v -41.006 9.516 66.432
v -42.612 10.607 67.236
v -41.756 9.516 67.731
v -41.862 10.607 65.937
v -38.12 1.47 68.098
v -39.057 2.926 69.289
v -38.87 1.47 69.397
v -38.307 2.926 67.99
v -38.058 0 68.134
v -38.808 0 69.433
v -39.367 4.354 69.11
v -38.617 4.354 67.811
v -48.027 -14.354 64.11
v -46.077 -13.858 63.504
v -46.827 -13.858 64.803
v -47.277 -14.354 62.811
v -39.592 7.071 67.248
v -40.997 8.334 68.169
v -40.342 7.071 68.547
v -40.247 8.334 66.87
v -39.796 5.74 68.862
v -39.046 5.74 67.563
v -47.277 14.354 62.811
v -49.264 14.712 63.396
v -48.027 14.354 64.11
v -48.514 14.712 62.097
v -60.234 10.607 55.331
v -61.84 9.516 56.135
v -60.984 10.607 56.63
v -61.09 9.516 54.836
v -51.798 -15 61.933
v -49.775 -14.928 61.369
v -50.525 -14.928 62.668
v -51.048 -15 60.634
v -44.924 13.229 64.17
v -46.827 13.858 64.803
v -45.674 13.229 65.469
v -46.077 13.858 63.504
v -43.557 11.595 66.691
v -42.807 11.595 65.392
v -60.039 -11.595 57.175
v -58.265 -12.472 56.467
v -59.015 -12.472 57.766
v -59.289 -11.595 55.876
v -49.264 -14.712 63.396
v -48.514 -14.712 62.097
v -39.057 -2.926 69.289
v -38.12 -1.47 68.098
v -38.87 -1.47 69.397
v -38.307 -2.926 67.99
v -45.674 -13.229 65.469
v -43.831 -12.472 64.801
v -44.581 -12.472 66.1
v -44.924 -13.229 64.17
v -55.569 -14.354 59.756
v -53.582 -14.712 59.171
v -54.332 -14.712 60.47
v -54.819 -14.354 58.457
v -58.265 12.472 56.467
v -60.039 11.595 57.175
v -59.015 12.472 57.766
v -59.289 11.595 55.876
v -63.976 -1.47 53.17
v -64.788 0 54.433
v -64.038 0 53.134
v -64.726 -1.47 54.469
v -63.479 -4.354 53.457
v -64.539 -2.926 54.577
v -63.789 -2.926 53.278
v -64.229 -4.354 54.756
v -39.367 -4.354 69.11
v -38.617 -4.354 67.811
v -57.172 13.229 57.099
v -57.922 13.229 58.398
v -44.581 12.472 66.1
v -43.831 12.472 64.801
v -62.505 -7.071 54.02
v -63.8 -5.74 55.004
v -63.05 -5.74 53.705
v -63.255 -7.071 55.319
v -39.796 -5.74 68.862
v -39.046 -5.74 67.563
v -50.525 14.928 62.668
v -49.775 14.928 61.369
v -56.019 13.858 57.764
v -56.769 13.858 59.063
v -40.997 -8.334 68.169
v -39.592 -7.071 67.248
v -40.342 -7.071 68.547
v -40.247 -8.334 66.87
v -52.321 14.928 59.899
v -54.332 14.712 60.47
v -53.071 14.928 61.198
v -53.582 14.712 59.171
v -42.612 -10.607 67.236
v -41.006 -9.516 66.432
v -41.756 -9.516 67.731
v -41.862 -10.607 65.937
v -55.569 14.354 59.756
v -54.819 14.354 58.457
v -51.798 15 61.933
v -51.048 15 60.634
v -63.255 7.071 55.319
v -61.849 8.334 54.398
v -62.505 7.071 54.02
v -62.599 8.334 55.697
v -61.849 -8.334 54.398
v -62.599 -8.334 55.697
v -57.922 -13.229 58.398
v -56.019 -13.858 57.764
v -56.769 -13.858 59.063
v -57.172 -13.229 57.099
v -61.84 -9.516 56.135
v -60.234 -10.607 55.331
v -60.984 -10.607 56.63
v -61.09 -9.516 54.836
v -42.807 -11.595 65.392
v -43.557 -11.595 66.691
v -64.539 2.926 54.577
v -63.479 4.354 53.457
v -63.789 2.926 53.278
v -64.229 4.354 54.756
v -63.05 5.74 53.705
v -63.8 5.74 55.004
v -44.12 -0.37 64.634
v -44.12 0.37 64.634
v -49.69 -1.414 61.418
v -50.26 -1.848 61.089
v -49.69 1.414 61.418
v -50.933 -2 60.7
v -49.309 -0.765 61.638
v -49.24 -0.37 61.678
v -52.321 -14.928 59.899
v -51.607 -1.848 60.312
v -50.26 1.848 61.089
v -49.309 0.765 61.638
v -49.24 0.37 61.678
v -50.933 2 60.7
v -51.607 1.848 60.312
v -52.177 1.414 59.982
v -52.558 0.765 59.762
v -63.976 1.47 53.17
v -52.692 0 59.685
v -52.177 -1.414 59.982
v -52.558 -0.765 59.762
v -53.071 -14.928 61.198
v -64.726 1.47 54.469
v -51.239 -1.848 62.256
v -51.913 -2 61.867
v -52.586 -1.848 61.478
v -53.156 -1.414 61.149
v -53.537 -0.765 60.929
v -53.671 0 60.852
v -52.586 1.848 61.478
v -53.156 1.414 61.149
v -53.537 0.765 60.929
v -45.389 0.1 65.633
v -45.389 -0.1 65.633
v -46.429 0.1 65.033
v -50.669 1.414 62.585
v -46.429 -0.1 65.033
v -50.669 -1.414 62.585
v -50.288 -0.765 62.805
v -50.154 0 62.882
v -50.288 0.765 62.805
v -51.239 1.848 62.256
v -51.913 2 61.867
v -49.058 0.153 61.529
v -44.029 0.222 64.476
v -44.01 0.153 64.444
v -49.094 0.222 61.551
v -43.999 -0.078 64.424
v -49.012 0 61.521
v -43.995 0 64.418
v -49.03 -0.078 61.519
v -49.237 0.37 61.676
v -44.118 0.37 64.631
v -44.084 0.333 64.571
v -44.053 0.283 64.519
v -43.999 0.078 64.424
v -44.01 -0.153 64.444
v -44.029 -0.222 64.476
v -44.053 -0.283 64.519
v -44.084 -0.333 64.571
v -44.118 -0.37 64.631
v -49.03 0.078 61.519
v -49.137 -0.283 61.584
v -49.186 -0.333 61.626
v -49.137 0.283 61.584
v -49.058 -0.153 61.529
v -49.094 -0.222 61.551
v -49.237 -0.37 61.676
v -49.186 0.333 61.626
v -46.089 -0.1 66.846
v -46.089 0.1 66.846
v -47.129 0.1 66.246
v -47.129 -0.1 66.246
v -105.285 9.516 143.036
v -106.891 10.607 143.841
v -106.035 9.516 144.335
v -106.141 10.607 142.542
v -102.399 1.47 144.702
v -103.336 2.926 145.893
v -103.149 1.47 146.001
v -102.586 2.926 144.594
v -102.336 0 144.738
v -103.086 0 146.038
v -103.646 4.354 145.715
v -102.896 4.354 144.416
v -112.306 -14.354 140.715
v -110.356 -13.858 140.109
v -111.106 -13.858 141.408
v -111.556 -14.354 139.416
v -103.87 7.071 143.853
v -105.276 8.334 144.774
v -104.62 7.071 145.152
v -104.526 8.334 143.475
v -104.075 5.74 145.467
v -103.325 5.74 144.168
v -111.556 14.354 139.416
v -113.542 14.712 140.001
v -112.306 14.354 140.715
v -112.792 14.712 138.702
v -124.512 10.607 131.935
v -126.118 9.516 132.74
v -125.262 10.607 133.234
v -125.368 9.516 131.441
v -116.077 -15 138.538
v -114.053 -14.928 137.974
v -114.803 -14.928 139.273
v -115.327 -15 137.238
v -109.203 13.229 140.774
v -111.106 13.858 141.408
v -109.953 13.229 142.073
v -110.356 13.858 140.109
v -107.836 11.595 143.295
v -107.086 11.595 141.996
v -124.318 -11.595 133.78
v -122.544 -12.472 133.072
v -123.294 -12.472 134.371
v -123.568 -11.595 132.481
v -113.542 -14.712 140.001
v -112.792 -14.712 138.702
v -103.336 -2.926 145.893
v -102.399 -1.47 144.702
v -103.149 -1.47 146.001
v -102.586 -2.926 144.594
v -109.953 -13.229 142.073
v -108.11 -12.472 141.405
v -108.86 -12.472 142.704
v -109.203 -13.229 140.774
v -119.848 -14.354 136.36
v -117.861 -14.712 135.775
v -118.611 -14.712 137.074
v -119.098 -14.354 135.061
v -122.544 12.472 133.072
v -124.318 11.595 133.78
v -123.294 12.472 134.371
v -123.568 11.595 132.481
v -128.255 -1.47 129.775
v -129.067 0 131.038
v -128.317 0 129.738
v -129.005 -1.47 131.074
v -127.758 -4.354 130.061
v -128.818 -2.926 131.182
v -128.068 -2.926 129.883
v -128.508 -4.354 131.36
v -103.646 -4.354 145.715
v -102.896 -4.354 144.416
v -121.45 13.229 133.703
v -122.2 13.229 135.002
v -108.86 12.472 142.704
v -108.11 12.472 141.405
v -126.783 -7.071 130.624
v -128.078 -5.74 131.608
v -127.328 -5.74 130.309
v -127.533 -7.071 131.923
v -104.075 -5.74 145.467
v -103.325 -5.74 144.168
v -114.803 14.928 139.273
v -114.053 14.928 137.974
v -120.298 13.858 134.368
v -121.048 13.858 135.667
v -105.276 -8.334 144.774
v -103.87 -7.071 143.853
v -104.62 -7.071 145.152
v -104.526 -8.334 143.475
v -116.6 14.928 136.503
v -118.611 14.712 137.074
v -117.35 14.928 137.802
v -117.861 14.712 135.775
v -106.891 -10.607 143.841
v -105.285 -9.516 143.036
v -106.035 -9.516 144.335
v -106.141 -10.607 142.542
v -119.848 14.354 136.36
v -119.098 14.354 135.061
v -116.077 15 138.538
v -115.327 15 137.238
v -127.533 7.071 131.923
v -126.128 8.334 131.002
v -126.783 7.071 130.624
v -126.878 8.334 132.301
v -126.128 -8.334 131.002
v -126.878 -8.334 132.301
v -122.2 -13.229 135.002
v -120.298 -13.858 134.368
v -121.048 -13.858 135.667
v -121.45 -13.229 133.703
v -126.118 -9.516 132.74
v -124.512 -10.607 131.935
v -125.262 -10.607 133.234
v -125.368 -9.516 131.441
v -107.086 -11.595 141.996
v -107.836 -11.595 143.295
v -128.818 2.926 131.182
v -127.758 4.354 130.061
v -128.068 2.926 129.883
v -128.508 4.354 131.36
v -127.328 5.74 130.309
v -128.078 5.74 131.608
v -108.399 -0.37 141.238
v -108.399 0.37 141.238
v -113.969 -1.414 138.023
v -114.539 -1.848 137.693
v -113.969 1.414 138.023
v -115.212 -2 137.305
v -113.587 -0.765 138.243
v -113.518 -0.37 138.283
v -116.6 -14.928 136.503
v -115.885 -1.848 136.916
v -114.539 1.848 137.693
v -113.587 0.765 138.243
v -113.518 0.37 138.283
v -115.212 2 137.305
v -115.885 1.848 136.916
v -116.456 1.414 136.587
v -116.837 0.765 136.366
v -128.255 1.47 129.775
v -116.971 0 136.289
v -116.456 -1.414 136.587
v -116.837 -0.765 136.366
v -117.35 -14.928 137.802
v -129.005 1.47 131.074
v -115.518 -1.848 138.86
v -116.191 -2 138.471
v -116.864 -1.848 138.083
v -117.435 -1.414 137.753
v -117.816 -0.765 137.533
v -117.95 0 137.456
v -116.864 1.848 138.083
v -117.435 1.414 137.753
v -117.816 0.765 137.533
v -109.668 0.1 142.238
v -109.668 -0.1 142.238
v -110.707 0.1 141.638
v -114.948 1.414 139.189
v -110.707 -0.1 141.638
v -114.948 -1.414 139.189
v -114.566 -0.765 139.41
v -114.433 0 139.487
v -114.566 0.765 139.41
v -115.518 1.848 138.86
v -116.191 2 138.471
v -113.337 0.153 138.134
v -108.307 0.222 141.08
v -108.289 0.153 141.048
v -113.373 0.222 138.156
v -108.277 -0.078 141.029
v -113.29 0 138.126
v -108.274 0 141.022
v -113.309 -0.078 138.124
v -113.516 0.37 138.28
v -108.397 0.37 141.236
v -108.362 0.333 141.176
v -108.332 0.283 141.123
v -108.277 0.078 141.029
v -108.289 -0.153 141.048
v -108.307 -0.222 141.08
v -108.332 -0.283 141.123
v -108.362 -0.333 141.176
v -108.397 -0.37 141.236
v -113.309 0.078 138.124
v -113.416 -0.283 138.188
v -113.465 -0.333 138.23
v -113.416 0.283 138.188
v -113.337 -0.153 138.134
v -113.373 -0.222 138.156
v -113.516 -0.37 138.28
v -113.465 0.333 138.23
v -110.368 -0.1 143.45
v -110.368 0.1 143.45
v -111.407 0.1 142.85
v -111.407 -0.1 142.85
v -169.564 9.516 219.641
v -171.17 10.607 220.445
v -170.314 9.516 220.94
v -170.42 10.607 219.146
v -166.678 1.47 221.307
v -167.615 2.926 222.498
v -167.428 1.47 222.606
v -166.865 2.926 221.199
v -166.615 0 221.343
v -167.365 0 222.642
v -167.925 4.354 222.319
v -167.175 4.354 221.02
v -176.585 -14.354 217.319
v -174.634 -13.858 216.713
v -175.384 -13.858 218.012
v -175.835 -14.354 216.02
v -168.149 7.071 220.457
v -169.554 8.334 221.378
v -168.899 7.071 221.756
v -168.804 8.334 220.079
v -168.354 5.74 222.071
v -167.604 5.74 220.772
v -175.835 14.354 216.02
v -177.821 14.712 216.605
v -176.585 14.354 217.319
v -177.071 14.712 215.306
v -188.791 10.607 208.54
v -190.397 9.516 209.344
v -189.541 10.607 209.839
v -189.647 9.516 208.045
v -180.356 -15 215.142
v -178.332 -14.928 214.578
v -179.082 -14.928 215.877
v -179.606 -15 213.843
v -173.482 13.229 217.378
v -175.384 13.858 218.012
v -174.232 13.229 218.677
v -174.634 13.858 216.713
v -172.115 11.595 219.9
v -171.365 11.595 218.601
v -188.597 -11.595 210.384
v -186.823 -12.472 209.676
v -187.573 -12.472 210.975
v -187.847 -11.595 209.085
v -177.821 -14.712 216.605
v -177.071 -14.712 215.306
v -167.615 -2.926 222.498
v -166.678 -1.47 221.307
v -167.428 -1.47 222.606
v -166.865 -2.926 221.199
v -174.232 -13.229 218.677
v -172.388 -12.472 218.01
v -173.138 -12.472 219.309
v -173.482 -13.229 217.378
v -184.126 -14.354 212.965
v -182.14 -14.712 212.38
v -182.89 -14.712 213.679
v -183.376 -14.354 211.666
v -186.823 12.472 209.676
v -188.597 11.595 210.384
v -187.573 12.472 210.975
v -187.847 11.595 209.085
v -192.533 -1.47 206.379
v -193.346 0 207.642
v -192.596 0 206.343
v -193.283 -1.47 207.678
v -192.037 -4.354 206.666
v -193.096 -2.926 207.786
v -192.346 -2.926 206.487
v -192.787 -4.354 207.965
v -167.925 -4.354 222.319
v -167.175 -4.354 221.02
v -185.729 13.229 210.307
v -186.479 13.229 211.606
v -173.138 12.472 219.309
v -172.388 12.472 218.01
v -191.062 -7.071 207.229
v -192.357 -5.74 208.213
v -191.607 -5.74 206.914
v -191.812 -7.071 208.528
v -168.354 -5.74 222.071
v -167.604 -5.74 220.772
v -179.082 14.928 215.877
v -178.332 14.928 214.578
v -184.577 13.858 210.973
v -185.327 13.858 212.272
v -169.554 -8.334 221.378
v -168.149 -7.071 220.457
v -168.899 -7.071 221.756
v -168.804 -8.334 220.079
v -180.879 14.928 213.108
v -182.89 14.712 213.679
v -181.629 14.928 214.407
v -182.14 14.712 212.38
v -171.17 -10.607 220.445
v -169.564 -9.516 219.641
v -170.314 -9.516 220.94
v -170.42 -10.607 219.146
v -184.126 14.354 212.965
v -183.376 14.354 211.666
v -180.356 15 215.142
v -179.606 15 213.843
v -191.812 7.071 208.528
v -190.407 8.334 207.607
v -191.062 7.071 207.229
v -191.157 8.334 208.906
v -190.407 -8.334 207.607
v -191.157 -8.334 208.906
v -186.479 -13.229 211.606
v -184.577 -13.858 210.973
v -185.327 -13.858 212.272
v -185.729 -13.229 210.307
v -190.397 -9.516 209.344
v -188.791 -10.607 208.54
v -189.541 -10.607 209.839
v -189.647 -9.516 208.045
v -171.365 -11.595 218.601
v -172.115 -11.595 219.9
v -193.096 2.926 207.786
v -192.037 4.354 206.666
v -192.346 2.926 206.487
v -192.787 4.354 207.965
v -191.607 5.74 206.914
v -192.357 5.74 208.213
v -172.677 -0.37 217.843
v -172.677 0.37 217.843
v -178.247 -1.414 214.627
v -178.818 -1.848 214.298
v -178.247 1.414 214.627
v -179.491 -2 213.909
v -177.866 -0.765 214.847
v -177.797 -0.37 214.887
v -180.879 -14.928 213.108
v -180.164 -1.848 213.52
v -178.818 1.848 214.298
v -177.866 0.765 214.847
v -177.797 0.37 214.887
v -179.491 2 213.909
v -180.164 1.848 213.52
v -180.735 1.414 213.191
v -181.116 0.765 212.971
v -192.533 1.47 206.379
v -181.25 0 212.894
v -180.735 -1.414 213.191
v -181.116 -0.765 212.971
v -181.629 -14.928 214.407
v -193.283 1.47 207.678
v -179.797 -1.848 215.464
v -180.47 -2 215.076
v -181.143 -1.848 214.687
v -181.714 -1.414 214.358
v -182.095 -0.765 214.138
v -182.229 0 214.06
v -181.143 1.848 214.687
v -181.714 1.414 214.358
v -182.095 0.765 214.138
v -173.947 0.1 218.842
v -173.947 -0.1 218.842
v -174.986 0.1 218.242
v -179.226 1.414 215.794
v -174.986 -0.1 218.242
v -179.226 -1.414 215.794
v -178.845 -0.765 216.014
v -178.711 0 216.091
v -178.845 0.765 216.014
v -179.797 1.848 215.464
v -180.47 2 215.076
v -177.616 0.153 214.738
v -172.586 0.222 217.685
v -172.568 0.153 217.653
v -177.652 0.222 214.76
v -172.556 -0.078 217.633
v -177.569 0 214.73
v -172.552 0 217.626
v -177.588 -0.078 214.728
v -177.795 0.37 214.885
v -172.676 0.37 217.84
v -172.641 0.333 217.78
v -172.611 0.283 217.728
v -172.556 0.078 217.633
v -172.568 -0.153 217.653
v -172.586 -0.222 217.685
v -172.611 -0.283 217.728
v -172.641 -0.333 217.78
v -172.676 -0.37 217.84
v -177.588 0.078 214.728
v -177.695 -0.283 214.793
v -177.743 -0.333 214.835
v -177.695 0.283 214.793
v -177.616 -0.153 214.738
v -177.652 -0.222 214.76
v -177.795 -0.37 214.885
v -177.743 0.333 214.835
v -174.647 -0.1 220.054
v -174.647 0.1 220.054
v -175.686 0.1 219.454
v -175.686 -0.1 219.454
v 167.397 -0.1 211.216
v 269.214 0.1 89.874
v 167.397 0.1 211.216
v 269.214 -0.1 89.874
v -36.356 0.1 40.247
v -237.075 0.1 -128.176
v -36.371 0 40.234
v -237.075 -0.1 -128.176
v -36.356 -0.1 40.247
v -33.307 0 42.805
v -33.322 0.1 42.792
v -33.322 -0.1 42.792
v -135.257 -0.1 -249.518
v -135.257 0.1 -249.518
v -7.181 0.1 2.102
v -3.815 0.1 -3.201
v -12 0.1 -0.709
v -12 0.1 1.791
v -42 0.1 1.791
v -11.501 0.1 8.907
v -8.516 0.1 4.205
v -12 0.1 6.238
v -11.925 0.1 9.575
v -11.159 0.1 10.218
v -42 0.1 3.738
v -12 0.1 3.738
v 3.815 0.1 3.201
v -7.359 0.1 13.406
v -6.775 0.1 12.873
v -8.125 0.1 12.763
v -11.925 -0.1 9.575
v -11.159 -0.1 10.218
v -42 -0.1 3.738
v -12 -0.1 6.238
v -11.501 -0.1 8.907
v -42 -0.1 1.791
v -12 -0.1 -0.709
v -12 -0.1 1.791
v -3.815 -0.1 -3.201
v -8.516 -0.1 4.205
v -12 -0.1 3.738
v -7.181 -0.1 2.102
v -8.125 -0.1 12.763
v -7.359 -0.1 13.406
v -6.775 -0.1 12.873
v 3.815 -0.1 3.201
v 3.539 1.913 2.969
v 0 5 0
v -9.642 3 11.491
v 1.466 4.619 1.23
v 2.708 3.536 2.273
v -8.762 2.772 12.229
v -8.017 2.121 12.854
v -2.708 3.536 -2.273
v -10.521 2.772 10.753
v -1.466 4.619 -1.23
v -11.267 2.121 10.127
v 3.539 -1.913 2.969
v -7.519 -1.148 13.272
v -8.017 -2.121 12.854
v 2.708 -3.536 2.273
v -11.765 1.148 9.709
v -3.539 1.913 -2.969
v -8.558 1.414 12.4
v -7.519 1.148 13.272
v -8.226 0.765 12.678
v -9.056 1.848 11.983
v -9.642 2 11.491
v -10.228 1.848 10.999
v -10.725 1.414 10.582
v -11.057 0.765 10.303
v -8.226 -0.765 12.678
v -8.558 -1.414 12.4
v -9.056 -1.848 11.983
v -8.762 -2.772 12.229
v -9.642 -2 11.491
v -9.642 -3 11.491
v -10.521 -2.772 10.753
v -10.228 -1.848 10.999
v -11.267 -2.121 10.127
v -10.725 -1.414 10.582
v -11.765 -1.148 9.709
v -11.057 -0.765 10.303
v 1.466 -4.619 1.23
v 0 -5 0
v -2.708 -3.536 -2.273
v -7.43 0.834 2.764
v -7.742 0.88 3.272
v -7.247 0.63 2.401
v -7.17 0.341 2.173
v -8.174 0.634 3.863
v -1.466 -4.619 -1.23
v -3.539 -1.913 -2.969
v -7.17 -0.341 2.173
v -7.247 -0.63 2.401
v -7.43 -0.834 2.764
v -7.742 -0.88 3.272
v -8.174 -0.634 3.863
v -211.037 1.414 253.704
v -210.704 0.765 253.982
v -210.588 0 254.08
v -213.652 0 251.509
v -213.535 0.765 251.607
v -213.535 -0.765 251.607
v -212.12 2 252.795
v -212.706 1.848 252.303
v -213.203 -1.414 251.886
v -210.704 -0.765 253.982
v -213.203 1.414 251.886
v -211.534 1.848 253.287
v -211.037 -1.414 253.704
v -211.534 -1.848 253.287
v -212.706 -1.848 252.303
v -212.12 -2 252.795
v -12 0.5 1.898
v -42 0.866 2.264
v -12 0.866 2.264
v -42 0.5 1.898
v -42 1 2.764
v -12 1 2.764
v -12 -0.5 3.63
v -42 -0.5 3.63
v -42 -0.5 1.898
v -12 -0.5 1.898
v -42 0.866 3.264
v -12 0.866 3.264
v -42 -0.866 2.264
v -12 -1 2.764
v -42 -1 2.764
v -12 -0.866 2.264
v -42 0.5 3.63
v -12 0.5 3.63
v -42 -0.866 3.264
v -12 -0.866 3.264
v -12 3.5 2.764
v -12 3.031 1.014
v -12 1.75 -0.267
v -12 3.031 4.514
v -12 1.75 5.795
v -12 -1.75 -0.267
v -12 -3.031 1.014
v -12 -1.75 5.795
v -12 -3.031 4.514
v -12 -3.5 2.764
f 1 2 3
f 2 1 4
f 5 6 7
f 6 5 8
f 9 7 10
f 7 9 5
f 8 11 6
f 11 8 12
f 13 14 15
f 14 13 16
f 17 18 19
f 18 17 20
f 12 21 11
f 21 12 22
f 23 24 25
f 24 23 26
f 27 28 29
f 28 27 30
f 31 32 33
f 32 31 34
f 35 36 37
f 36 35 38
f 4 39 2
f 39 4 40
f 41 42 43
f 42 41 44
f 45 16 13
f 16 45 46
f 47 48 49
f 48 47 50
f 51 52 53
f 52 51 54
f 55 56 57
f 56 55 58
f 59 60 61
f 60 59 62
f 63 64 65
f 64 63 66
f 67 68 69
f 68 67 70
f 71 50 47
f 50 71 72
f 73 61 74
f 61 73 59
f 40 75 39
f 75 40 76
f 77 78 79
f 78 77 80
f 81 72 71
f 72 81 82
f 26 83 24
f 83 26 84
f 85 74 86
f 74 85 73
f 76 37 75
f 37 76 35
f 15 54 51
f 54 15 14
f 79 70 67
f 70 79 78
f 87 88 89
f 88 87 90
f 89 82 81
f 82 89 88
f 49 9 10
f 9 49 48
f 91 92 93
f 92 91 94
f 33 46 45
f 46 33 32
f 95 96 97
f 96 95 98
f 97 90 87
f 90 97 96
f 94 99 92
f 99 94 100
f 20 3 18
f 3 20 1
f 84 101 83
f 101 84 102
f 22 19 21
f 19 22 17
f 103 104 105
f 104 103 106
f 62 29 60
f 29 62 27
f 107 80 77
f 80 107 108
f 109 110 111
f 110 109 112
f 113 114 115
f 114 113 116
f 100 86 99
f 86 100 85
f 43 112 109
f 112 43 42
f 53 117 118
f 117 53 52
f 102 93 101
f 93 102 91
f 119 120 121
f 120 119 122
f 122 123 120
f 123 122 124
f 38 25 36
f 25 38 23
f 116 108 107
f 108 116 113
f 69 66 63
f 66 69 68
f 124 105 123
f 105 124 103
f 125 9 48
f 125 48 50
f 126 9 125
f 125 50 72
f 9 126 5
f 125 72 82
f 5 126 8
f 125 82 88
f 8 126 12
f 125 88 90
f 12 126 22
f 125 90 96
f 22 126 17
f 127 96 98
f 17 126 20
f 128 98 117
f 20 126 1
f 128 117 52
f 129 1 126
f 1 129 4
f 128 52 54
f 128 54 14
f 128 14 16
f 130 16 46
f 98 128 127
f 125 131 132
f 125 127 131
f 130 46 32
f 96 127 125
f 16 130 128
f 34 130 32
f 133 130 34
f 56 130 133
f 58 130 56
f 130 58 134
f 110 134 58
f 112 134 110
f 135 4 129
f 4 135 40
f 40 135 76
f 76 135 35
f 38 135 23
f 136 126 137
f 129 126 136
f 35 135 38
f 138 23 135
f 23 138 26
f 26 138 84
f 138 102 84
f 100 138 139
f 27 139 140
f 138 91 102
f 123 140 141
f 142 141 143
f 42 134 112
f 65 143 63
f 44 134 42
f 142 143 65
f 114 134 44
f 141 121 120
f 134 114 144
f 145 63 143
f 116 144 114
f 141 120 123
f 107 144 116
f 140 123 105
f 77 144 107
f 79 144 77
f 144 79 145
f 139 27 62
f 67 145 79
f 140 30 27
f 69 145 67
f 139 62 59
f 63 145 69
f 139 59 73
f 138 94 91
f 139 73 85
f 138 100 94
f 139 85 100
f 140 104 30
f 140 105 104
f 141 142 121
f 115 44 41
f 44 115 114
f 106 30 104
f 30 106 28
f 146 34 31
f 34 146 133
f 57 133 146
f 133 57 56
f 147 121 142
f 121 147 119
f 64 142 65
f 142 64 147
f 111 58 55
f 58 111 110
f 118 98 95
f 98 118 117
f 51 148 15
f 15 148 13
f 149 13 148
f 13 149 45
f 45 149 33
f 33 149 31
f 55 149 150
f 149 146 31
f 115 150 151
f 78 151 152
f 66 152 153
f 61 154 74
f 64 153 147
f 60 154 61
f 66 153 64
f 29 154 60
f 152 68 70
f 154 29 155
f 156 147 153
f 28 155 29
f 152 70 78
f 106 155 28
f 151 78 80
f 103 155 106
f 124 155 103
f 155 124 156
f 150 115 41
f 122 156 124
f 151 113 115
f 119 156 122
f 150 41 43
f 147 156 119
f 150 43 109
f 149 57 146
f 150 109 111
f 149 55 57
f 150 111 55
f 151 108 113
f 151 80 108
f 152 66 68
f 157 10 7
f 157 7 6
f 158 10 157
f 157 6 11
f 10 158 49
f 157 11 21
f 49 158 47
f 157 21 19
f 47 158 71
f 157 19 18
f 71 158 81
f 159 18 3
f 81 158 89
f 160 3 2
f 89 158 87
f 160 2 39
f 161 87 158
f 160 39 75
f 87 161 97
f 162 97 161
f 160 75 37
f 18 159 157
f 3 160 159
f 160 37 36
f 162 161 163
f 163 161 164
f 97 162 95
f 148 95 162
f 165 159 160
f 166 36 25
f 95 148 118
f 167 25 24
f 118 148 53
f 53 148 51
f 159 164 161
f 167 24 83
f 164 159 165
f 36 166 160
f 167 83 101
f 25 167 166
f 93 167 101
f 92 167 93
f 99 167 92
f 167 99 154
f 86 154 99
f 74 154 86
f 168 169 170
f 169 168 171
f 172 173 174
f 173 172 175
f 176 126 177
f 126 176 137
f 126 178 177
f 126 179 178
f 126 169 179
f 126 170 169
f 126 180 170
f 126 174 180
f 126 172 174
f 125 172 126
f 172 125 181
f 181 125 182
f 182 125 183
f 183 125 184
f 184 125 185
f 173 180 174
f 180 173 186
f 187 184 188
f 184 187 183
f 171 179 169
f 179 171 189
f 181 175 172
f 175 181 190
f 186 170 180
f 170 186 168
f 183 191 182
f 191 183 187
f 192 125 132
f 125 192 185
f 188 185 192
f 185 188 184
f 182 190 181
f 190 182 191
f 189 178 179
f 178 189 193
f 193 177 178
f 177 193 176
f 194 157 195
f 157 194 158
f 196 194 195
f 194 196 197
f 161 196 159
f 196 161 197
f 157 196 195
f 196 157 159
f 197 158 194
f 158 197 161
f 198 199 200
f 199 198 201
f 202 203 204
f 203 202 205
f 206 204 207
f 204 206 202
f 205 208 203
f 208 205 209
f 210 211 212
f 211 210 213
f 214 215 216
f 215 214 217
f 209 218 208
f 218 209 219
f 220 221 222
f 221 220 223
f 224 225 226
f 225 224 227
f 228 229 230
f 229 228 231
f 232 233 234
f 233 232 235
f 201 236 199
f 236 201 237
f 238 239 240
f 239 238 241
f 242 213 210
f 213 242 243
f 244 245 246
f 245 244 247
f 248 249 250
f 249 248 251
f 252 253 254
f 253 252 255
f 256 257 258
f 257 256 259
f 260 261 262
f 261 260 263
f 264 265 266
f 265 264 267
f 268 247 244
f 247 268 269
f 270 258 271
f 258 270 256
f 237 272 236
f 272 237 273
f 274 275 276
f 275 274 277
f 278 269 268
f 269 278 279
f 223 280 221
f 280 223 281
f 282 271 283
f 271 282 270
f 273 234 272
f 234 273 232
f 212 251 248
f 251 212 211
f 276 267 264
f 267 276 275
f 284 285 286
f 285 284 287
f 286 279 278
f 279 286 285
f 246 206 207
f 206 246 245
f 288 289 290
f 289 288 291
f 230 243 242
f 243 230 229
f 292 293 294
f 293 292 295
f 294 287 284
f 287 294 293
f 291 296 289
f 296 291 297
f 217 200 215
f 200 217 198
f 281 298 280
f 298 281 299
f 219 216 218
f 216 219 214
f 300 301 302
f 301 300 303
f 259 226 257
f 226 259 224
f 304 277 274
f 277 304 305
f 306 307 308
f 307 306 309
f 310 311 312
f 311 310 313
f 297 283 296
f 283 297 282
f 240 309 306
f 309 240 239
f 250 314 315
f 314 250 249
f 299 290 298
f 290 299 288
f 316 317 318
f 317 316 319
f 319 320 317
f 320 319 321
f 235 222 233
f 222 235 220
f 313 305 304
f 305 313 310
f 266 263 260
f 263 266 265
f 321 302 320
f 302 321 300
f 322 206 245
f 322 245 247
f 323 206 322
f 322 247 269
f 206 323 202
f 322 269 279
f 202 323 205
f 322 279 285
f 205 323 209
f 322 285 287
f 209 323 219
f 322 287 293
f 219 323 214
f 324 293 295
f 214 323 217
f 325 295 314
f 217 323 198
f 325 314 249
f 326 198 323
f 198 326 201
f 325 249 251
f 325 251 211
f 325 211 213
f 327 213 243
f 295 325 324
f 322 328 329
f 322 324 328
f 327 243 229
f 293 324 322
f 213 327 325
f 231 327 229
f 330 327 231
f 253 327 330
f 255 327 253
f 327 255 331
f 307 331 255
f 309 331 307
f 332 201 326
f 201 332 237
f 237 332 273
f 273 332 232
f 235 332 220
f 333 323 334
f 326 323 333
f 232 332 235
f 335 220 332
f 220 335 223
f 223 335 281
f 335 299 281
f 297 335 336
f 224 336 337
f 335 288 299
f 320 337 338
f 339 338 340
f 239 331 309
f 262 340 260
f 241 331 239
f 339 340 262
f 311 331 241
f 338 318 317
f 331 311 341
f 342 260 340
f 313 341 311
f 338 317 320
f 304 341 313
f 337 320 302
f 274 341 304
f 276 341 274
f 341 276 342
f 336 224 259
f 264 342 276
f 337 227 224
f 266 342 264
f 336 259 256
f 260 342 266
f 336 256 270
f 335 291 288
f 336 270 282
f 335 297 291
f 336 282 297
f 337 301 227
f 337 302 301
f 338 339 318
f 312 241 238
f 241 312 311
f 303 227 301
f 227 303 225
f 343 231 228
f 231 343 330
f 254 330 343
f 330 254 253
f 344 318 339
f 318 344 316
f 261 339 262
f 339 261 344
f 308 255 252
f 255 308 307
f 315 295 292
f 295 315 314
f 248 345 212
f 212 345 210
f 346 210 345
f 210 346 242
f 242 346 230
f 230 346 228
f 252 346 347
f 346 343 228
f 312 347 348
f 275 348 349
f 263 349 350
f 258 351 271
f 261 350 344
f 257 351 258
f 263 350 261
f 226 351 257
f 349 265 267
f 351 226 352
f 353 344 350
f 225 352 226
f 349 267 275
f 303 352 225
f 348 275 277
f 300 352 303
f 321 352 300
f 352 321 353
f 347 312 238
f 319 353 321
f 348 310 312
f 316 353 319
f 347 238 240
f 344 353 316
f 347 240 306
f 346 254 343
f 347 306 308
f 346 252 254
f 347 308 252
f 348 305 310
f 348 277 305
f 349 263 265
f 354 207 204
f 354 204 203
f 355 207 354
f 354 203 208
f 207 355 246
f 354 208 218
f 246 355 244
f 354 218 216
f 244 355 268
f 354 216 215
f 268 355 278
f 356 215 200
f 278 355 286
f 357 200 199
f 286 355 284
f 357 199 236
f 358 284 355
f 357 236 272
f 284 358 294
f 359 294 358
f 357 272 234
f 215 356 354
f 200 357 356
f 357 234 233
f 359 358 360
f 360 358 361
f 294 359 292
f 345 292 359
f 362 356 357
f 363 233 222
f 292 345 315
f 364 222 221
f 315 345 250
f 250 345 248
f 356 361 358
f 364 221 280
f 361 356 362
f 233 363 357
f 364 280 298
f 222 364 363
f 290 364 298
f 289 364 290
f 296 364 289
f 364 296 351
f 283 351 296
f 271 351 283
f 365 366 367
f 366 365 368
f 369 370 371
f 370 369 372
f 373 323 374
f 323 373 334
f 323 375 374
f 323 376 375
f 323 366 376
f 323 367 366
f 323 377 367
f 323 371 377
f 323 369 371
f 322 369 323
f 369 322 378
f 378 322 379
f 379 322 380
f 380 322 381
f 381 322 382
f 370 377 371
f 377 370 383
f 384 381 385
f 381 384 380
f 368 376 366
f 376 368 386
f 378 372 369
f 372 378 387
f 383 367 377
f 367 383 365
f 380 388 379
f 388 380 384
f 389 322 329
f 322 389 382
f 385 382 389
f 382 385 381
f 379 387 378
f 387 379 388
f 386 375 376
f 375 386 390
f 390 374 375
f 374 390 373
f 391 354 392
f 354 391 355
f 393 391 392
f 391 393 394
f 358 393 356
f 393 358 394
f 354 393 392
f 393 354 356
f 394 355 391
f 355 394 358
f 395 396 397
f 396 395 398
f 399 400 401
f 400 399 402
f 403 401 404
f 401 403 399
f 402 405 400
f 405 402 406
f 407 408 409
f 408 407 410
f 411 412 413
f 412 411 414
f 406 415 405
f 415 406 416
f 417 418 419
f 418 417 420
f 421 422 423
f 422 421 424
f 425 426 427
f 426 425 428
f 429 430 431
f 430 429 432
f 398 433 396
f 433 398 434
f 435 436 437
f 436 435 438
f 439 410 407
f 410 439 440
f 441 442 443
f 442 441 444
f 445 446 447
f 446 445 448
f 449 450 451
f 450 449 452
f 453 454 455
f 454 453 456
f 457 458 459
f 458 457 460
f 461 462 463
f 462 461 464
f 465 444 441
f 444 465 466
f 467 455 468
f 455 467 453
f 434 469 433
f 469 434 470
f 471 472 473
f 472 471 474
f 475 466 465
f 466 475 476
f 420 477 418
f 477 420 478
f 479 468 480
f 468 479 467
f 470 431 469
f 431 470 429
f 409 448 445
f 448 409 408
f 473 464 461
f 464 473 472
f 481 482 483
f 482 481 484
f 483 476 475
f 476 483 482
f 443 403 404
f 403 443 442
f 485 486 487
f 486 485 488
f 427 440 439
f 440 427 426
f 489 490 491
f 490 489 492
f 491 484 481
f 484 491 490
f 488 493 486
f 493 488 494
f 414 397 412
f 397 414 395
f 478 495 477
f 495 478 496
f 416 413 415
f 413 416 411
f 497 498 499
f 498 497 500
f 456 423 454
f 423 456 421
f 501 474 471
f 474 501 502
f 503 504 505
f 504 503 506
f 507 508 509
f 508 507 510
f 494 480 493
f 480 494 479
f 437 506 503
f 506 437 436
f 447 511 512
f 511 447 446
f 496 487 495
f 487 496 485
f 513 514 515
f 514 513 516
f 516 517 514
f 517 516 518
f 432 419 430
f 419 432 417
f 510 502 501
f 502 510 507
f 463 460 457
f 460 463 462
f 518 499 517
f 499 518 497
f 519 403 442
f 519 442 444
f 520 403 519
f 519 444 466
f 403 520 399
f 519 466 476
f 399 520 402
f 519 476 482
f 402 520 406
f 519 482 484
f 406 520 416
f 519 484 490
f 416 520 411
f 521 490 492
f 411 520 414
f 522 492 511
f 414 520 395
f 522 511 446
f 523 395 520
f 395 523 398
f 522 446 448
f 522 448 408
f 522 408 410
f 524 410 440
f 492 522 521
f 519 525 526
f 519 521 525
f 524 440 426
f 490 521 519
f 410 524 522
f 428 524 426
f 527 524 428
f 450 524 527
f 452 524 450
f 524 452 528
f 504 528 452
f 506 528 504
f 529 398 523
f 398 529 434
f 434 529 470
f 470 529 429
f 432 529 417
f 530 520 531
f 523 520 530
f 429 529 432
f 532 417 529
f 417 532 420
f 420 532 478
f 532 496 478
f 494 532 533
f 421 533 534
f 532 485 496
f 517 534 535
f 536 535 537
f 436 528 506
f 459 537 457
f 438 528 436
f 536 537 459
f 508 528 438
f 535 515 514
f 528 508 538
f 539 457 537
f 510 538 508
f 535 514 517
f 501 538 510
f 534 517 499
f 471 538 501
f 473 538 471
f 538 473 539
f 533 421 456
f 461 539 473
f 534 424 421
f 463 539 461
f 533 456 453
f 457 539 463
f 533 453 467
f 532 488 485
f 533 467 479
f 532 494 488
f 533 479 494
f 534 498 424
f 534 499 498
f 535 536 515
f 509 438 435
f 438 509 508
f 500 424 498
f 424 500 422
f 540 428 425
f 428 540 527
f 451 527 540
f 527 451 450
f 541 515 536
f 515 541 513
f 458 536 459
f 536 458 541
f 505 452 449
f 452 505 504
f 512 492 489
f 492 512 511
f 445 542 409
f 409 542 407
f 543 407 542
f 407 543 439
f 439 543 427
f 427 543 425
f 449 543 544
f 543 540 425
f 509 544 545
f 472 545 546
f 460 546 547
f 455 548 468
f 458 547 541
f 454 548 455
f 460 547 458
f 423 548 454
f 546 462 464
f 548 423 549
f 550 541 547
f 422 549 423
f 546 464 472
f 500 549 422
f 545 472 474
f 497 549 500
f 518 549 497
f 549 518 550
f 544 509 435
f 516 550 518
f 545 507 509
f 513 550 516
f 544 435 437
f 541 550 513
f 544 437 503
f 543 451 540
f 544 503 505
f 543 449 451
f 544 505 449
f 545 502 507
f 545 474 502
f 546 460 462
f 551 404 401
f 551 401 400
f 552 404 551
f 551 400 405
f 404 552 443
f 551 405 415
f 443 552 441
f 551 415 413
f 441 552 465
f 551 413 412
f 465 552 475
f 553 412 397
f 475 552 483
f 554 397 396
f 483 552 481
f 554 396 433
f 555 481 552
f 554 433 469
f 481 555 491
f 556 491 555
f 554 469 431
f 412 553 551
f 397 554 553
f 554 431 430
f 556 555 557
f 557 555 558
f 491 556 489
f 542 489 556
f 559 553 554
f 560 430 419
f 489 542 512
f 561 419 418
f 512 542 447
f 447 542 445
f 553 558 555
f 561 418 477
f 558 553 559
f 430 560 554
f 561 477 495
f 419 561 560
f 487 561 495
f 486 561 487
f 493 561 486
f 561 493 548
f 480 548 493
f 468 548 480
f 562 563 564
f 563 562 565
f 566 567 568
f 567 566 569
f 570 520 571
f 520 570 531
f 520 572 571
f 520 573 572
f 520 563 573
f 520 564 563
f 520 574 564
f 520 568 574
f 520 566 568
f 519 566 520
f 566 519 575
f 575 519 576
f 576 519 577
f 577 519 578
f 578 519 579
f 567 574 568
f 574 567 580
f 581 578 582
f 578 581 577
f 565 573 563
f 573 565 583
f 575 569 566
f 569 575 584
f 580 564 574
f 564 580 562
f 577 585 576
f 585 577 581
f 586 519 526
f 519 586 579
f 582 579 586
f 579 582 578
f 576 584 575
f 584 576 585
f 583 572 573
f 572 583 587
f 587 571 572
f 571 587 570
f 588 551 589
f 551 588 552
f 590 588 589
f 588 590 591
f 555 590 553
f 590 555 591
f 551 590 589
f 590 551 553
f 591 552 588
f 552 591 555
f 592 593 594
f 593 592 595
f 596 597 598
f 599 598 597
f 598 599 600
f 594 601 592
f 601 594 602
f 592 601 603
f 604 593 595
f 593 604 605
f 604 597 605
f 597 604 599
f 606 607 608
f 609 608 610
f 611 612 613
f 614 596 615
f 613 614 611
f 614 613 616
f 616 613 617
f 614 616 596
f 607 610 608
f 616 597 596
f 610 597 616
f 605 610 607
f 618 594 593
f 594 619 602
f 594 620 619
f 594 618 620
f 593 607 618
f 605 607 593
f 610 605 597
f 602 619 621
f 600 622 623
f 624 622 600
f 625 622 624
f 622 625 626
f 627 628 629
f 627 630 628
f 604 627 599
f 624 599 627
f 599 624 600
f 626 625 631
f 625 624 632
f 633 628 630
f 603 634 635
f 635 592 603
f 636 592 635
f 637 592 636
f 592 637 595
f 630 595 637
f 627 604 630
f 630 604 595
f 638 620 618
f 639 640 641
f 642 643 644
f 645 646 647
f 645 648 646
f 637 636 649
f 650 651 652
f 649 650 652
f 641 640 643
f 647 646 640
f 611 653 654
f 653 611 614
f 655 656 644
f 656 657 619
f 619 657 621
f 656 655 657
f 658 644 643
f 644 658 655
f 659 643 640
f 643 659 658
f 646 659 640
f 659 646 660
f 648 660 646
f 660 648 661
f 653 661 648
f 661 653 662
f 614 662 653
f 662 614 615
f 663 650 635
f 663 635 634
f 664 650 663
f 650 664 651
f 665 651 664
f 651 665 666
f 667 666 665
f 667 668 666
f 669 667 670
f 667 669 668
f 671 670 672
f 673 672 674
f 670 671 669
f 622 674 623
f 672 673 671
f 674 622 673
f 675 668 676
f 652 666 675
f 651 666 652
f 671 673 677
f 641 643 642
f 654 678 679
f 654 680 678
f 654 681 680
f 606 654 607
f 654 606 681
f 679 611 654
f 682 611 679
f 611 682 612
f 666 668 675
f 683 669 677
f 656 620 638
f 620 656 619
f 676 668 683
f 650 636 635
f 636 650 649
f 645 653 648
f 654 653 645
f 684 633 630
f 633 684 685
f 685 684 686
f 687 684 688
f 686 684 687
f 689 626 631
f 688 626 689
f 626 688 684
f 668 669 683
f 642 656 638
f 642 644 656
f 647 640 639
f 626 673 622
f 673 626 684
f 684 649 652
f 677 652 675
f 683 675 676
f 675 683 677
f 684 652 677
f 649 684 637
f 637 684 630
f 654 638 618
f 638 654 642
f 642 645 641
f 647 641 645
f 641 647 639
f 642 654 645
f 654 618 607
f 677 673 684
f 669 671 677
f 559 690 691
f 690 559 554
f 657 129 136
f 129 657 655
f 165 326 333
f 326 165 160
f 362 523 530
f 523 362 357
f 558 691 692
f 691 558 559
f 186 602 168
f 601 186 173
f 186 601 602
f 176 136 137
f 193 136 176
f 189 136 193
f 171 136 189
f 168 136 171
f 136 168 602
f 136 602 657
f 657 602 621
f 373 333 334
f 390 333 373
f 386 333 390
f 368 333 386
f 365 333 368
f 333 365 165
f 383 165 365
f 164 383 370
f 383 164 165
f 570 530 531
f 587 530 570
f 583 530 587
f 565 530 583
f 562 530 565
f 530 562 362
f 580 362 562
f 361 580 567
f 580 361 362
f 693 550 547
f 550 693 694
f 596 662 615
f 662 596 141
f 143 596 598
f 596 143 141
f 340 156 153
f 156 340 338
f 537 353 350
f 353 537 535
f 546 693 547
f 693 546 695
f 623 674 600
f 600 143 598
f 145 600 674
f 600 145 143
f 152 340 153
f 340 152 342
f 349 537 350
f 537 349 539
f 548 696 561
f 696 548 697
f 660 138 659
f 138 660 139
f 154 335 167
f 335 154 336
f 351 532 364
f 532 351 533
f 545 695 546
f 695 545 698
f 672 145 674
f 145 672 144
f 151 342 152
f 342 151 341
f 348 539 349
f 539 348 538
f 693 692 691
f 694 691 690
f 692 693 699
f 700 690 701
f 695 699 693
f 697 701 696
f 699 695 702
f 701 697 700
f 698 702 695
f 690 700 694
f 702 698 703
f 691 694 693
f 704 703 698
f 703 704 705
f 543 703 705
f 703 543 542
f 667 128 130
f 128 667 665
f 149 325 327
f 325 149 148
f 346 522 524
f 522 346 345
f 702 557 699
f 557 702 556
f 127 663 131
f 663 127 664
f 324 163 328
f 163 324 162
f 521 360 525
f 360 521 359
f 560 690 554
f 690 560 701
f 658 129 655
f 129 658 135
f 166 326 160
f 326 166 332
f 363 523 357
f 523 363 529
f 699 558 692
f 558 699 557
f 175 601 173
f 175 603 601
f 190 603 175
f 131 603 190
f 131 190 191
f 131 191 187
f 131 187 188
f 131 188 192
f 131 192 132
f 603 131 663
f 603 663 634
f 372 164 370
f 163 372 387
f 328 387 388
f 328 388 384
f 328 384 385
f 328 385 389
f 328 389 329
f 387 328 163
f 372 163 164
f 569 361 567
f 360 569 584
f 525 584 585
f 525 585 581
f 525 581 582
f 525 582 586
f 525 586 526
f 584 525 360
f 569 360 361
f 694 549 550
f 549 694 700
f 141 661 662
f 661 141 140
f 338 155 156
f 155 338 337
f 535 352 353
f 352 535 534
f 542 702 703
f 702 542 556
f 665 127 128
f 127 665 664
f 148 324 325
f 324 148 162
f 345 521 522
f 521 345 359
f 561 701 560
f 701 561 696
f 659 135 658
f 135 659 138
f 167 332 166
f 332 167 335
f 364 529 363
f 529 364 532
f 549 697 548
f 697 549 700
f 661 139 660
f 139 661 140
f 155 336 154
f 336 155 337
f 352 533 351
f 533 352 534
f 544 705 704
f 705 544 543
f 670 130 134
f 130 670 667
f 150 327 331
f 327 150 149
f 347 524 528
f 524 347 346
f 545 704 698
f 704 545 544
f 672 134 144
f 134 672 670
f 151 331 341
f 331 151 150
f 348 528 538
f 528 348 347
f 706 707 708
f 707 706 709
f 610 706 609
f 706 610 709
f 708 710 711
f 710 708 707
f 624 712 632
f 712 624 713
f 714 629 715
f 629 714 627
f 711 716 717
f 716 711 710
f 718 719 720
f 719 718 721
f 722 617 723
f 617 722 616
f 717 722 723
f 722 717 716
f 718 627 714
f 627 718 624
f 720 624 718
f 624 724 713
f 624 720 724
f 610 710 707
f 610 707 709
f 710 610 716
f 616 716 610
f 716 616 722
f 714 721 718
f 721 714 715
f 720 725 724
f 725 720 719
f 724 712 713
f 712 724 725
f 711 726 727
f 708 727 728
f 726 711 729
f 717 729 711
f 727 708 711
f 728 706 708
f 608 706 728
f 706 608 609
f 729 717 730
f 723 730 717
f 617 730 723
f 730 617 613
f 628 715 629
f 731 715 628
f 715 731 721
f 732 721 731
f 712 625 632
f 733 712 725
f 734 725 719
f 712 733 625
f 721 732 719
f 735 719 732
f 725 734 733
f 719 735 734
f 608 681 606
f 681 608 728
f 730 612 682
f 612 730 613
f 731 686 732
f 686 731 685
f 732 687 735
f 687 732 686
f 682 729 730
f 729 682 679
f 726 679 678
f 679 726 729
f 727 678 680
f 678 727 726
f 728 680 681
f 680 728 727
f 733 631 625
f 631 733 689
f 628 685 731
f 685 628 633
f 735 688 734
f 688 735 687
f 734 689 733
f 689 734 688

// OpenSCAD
// Coaxial Autogyro Stack — Parametric 3D Model
// OpenSCAD — renders to STL, PNG (preview mode for colors)
//
// Parameters match the Julia model:
//   AutogyroRotor(radius=1.5, hub_radius=0.1, n_blades=2, blade_chord=0.15,
//                 tilt_deg=10.0, blade_pitch_deg=0.0, mass=5.0)
//   AutogyroStack([r,r,r], fill(10.0, 4), line_diameter=0.004, line_angle_deg=50.0)

// ============================================================
// PARAMETERS — edit these to match your Julia model
// ============================================================

// Rotor geometry
ROTOR_RADIUS       = 1.5;    // m — disk radius
HUB_RADIUS         = 0.1;    // m — central hub
N_BLADES           = 2;      // number of blades
BLADE_CHORD        = 0.15;   // m — mean chord width
BLADE_THICKNESS    = 0.03;   // m — visual blade thickness

// Stack geometry
N_ROTORS           = 3;      // number of rotors in stack
SECTION_LENGTH     = 10.0;   // m — spacing between rotors
BOTTOM_EXTRA       = 3.0;    // m — line below bottom rotor to anchor
LINE_DIAMETER      = 0.004;  // m — Dyneema line
LINE_ANGLE         = 50.0;   // degrees — line elevation from horizontal

// Disk tilt (pitch relative to perpendicular-to-line)
TILT_ANGLE         = 10.0;   // degrees — forward-down into wind

// Hub / mechanical detail
HUB_HEIGHT         = 0.12;   // m — thickness of hub along line
BEARING_DIAMETER   = 0.14;   // m — thrust bearing diameter
TAIL_BOOM_LENGTH   = 0.8;    // m — empennage boom
TAIL_SPAN          = 0.4;    // m — horizontal stabilizer half-span
TAIL_CHORD         = 0.12;   // m — stabilizer chord

// Visual scaling for display
VISUAL_SCALE       = 10.0;   // scale factor: model units → display units
LINE_DIA_SCALE     = 100.0;  // visual exaggeration for 4mm line

// ============================================================
// DERIVED VALUES
// ============================================================

TOTAL_LINE_LENGTH = N_ROTORS * SECTION_LENGTH + BOTTOM_EXTRA;
VIS_LINE_DIA = max(LINE_DIAMETER * LINE_DIA_SCALE * VISUAL_SCALE, 1.0);
DEG = 3.14159265359 / 180;  // degrees to radians

// ============================================================
// MODULES
// ============================================================

// A single rotor blade
module blade(length, chord, thickness) {
    translate([0, -chord/2, -thickness/2])
        cube([length, chord, thickness]);
}

// Rotor swept disk (annulus) — thicker for visibility
module swept_disk() {
    $fn = 64;
    vs = VISUAL_SCALE;
    color([0.72, 0.13, 0.13], 0.55) {
        difference() {
            cylinder(h=0.15 * vs, r=ROTOR_RADIUS * vs, center=true);
            cylinder(h=0.20 * vs, r=HUB_RADIUS * vs, center=true);
        }
    }
}

// Hub and bearing assembly
module hub_assembly() {
    $fn = 64;
    vs = VISUAL_SCALE;

    // Main hub body
    color("DimGray", 0.85)
        cylinder(h=HUB_HEIGHT * vs, r=HUB_RADIUS * vs, center=true);

    // Thrust bearing — metallic ring
    color("Silver", 0.9) {
        difference() {
            cylinder(h=0.06 * vs, r=BEARING_DIAMETER/2 * vs, center=true);
            cylinder(h=0.08 * vs, r=HUB_RADIUS * vs, center=true);
        }
    }

    // Bearing balls (decorative)
    for (i = [0:7]) {
        angle = i * 45;
        r = (HUB_RADIUS + BEARING_DIAMETER/2) / 2 * vs;
        color("Gold", 0.8)
            translate([r * cos(angle), r * sin(angle), 0])
                sphere(r=0.03 * vs, $fn=8);
    }
}

// Blades
module blades() {
    vs = VISUAL_SCALE;
    for (i = [0 : N_BLADES-1]) {
        angle = i * 360 / N_BLADES;
        rotate([0, 0, angle]) {
            color("DarkSlateGray", 0.75)
                blade(ROTOR_RADIUS * vs - HUB_RADIUS * vs,
                      BLADE_CHORD * vs,
                      BLADE_THICKNESS * vs);
        }
    }
}

// Empennage: boom + horizontal stabilizer
module empennage() {
    $fn = 32;
    vs = VISUAL_SCALE;

    // Boom
    color("DimGray", 0.6) {
        rotate([0, 90, 0])
            cylinder(h=TAIL_BOOM_LENGTH * vs, r=0.04 * vs);
    }

    // Stabilizer
    st = TAIL_BOOM_LENGTH * vs * 0.85;
    translate([st, 0, 0]) {
        color("DarkSlateGray", 0.6)
            cube([TAIL_CHORD * vs, TAIL_SPAN * 2 * vs, 0.03 * vs], center=true);
    }

    // Vertical fin
    translate([st, 0, 0.15 * vs]) {
        color("DarkSlateGray", 0.5)
            cube([TAIL_CHORD * vs, 0.02 * vs, 0.25 * vs], center=true);
    }
}

// Full rotor assembly: disk + hub + blades + empennage
module rotor_assembly() {
    // Tilt: leading edge forward-down into the wind
    // Disk plane perpendicular to line = YZ plane
    // TILT_ANGLE rotates the top of the disk forward (around Y axis)
    rotate([0, TILT_ANGLE, 0]) {
        swept_disk();
        hub_assembly();
        blades();
        // Empennage extends downwind from below hub
        translate([0, 0, -HUB_HEIGHT * VISUAL_SCALE / 2])
            empennage();
    }
}

// ============================================================
// SCENE: World-space assembly
// ============================================================

// Tension line: runs along +Z, then tilted to LINE_ANGLE from horizontal
module tension_line() {
    color("RoyalBlue", 0.75)
        cylinder(h=TOTAL_LINE_LENGTH * VISUAL_SCALE, r=VIS_LINE_DIA/2, center=false, $fn=16);
}

// Ground plane
module ground_plane() {
    hw = TOTAL_LINE_LENGTH * VISUAL_SCALE * 0.8;  // wide enough
    color("ForestGreen", 0.4)
        translate([-hw, -0.1, -hw * 0.3])
            cube([2*hw, 0.2, hw * 0.6]);
}

// Anchor base
module anchor_base() {
    color("SaddleBrown", 0.8)
        cylinder(h=1.5 * VISUAL_SCALE, r1=0.5 * VISUAL_SCALE, r2=0.3 * VISUAL_SCALE, $fn=16);
}

// Free-end marker
module free_end() {
    color("Gray", 0.5)
        sphere(r=0.15 * VISUAL_SCALE, $fn=16);
}

// Wind arrow (horizontal, points right)
module wind_arrow() {
    vs = VISUAL_SCALE;
    color("DeepSkyBlue", 0.8) {
        // Shaft
        translate([0, 0, -1.5 * vs])
            cylinder(h=3.0 * vs, r=0.1 * vs, $fn=12);
        // Arrowhead
        translate([0, 0, 1.5 * vs])
            cylinder(h=0.6 * vs, r1=0.35 * vs, r2=0, $fn=12);
    }
}

// ============================================================
// MAIN SCENE
// ============================================================

// The line is built along +Z (vertical).
// We rotate around Y to tilt it to LINE_ANGLE from horizontal:
//   LINE_ANGLE = 50° means 50° up from horizontal
//   Vertical = 90° from horizontal → need rotation of -(90-50) = -40° around Y
//   This tilts +Z toward +X

rotate([0, -(90 - LINE_ANGLE), 0]) {

    // Ground plane at anchor level
    translate([0, 0, -2.5 * VISUAL_SCALE])
        ground_plane();

    // Anchor post
    translate([0, 0, 0])
        anchor_base();

    // Tension line
    tension_line();

    // Place rotors: bottom rotor first (closest to anchor)
    // Place rotors along the line
    // Rotor index 0 = bottom rotor (closest to anchor)
    for (i = [0 : N_ROTORS-1]) {
        z_pos = (BOTTOM_EXTRA + i * SECTION_LENGTH + SECTION_LENGTH/2) * VISUAL_SCALE;
        translate([0, 0, z_pos])
            rotor_assembly();
    }
}

// Wind arrow in world space: blows horizontally from left, positioned mid-height
arrow_y = (TOTAL_LINE_LENGTH * VISUAL_SCALE) * sin(LINE_ANGLE * DEG) * 0.55;
arrow_x = -ROTOR_RADIUS * VISUAL_SCALE * 1.8;
translate([arrow_x, 0, arrow_y])
    rotate([0, 90, 0])
        wind_arrow();

// ============================================================
// RENDER INSTRUCTIONS
// ============================================================
//
// GUI preview:
//   openscad autogyro_stack.scad
//
// PNG (preview mode preserves colors):
//   openscad --preview -o autogyro_stack.png --imgsize=1920,1080 \
//     --autocenter --viewall --colorscheme=Cornfield \
//     --projection=ortho autogyro_stack.scad
//
// STL (full geometry, monochrome):
//   openscad --render -o autogyro_stack.stl autogyro_stack.scad
